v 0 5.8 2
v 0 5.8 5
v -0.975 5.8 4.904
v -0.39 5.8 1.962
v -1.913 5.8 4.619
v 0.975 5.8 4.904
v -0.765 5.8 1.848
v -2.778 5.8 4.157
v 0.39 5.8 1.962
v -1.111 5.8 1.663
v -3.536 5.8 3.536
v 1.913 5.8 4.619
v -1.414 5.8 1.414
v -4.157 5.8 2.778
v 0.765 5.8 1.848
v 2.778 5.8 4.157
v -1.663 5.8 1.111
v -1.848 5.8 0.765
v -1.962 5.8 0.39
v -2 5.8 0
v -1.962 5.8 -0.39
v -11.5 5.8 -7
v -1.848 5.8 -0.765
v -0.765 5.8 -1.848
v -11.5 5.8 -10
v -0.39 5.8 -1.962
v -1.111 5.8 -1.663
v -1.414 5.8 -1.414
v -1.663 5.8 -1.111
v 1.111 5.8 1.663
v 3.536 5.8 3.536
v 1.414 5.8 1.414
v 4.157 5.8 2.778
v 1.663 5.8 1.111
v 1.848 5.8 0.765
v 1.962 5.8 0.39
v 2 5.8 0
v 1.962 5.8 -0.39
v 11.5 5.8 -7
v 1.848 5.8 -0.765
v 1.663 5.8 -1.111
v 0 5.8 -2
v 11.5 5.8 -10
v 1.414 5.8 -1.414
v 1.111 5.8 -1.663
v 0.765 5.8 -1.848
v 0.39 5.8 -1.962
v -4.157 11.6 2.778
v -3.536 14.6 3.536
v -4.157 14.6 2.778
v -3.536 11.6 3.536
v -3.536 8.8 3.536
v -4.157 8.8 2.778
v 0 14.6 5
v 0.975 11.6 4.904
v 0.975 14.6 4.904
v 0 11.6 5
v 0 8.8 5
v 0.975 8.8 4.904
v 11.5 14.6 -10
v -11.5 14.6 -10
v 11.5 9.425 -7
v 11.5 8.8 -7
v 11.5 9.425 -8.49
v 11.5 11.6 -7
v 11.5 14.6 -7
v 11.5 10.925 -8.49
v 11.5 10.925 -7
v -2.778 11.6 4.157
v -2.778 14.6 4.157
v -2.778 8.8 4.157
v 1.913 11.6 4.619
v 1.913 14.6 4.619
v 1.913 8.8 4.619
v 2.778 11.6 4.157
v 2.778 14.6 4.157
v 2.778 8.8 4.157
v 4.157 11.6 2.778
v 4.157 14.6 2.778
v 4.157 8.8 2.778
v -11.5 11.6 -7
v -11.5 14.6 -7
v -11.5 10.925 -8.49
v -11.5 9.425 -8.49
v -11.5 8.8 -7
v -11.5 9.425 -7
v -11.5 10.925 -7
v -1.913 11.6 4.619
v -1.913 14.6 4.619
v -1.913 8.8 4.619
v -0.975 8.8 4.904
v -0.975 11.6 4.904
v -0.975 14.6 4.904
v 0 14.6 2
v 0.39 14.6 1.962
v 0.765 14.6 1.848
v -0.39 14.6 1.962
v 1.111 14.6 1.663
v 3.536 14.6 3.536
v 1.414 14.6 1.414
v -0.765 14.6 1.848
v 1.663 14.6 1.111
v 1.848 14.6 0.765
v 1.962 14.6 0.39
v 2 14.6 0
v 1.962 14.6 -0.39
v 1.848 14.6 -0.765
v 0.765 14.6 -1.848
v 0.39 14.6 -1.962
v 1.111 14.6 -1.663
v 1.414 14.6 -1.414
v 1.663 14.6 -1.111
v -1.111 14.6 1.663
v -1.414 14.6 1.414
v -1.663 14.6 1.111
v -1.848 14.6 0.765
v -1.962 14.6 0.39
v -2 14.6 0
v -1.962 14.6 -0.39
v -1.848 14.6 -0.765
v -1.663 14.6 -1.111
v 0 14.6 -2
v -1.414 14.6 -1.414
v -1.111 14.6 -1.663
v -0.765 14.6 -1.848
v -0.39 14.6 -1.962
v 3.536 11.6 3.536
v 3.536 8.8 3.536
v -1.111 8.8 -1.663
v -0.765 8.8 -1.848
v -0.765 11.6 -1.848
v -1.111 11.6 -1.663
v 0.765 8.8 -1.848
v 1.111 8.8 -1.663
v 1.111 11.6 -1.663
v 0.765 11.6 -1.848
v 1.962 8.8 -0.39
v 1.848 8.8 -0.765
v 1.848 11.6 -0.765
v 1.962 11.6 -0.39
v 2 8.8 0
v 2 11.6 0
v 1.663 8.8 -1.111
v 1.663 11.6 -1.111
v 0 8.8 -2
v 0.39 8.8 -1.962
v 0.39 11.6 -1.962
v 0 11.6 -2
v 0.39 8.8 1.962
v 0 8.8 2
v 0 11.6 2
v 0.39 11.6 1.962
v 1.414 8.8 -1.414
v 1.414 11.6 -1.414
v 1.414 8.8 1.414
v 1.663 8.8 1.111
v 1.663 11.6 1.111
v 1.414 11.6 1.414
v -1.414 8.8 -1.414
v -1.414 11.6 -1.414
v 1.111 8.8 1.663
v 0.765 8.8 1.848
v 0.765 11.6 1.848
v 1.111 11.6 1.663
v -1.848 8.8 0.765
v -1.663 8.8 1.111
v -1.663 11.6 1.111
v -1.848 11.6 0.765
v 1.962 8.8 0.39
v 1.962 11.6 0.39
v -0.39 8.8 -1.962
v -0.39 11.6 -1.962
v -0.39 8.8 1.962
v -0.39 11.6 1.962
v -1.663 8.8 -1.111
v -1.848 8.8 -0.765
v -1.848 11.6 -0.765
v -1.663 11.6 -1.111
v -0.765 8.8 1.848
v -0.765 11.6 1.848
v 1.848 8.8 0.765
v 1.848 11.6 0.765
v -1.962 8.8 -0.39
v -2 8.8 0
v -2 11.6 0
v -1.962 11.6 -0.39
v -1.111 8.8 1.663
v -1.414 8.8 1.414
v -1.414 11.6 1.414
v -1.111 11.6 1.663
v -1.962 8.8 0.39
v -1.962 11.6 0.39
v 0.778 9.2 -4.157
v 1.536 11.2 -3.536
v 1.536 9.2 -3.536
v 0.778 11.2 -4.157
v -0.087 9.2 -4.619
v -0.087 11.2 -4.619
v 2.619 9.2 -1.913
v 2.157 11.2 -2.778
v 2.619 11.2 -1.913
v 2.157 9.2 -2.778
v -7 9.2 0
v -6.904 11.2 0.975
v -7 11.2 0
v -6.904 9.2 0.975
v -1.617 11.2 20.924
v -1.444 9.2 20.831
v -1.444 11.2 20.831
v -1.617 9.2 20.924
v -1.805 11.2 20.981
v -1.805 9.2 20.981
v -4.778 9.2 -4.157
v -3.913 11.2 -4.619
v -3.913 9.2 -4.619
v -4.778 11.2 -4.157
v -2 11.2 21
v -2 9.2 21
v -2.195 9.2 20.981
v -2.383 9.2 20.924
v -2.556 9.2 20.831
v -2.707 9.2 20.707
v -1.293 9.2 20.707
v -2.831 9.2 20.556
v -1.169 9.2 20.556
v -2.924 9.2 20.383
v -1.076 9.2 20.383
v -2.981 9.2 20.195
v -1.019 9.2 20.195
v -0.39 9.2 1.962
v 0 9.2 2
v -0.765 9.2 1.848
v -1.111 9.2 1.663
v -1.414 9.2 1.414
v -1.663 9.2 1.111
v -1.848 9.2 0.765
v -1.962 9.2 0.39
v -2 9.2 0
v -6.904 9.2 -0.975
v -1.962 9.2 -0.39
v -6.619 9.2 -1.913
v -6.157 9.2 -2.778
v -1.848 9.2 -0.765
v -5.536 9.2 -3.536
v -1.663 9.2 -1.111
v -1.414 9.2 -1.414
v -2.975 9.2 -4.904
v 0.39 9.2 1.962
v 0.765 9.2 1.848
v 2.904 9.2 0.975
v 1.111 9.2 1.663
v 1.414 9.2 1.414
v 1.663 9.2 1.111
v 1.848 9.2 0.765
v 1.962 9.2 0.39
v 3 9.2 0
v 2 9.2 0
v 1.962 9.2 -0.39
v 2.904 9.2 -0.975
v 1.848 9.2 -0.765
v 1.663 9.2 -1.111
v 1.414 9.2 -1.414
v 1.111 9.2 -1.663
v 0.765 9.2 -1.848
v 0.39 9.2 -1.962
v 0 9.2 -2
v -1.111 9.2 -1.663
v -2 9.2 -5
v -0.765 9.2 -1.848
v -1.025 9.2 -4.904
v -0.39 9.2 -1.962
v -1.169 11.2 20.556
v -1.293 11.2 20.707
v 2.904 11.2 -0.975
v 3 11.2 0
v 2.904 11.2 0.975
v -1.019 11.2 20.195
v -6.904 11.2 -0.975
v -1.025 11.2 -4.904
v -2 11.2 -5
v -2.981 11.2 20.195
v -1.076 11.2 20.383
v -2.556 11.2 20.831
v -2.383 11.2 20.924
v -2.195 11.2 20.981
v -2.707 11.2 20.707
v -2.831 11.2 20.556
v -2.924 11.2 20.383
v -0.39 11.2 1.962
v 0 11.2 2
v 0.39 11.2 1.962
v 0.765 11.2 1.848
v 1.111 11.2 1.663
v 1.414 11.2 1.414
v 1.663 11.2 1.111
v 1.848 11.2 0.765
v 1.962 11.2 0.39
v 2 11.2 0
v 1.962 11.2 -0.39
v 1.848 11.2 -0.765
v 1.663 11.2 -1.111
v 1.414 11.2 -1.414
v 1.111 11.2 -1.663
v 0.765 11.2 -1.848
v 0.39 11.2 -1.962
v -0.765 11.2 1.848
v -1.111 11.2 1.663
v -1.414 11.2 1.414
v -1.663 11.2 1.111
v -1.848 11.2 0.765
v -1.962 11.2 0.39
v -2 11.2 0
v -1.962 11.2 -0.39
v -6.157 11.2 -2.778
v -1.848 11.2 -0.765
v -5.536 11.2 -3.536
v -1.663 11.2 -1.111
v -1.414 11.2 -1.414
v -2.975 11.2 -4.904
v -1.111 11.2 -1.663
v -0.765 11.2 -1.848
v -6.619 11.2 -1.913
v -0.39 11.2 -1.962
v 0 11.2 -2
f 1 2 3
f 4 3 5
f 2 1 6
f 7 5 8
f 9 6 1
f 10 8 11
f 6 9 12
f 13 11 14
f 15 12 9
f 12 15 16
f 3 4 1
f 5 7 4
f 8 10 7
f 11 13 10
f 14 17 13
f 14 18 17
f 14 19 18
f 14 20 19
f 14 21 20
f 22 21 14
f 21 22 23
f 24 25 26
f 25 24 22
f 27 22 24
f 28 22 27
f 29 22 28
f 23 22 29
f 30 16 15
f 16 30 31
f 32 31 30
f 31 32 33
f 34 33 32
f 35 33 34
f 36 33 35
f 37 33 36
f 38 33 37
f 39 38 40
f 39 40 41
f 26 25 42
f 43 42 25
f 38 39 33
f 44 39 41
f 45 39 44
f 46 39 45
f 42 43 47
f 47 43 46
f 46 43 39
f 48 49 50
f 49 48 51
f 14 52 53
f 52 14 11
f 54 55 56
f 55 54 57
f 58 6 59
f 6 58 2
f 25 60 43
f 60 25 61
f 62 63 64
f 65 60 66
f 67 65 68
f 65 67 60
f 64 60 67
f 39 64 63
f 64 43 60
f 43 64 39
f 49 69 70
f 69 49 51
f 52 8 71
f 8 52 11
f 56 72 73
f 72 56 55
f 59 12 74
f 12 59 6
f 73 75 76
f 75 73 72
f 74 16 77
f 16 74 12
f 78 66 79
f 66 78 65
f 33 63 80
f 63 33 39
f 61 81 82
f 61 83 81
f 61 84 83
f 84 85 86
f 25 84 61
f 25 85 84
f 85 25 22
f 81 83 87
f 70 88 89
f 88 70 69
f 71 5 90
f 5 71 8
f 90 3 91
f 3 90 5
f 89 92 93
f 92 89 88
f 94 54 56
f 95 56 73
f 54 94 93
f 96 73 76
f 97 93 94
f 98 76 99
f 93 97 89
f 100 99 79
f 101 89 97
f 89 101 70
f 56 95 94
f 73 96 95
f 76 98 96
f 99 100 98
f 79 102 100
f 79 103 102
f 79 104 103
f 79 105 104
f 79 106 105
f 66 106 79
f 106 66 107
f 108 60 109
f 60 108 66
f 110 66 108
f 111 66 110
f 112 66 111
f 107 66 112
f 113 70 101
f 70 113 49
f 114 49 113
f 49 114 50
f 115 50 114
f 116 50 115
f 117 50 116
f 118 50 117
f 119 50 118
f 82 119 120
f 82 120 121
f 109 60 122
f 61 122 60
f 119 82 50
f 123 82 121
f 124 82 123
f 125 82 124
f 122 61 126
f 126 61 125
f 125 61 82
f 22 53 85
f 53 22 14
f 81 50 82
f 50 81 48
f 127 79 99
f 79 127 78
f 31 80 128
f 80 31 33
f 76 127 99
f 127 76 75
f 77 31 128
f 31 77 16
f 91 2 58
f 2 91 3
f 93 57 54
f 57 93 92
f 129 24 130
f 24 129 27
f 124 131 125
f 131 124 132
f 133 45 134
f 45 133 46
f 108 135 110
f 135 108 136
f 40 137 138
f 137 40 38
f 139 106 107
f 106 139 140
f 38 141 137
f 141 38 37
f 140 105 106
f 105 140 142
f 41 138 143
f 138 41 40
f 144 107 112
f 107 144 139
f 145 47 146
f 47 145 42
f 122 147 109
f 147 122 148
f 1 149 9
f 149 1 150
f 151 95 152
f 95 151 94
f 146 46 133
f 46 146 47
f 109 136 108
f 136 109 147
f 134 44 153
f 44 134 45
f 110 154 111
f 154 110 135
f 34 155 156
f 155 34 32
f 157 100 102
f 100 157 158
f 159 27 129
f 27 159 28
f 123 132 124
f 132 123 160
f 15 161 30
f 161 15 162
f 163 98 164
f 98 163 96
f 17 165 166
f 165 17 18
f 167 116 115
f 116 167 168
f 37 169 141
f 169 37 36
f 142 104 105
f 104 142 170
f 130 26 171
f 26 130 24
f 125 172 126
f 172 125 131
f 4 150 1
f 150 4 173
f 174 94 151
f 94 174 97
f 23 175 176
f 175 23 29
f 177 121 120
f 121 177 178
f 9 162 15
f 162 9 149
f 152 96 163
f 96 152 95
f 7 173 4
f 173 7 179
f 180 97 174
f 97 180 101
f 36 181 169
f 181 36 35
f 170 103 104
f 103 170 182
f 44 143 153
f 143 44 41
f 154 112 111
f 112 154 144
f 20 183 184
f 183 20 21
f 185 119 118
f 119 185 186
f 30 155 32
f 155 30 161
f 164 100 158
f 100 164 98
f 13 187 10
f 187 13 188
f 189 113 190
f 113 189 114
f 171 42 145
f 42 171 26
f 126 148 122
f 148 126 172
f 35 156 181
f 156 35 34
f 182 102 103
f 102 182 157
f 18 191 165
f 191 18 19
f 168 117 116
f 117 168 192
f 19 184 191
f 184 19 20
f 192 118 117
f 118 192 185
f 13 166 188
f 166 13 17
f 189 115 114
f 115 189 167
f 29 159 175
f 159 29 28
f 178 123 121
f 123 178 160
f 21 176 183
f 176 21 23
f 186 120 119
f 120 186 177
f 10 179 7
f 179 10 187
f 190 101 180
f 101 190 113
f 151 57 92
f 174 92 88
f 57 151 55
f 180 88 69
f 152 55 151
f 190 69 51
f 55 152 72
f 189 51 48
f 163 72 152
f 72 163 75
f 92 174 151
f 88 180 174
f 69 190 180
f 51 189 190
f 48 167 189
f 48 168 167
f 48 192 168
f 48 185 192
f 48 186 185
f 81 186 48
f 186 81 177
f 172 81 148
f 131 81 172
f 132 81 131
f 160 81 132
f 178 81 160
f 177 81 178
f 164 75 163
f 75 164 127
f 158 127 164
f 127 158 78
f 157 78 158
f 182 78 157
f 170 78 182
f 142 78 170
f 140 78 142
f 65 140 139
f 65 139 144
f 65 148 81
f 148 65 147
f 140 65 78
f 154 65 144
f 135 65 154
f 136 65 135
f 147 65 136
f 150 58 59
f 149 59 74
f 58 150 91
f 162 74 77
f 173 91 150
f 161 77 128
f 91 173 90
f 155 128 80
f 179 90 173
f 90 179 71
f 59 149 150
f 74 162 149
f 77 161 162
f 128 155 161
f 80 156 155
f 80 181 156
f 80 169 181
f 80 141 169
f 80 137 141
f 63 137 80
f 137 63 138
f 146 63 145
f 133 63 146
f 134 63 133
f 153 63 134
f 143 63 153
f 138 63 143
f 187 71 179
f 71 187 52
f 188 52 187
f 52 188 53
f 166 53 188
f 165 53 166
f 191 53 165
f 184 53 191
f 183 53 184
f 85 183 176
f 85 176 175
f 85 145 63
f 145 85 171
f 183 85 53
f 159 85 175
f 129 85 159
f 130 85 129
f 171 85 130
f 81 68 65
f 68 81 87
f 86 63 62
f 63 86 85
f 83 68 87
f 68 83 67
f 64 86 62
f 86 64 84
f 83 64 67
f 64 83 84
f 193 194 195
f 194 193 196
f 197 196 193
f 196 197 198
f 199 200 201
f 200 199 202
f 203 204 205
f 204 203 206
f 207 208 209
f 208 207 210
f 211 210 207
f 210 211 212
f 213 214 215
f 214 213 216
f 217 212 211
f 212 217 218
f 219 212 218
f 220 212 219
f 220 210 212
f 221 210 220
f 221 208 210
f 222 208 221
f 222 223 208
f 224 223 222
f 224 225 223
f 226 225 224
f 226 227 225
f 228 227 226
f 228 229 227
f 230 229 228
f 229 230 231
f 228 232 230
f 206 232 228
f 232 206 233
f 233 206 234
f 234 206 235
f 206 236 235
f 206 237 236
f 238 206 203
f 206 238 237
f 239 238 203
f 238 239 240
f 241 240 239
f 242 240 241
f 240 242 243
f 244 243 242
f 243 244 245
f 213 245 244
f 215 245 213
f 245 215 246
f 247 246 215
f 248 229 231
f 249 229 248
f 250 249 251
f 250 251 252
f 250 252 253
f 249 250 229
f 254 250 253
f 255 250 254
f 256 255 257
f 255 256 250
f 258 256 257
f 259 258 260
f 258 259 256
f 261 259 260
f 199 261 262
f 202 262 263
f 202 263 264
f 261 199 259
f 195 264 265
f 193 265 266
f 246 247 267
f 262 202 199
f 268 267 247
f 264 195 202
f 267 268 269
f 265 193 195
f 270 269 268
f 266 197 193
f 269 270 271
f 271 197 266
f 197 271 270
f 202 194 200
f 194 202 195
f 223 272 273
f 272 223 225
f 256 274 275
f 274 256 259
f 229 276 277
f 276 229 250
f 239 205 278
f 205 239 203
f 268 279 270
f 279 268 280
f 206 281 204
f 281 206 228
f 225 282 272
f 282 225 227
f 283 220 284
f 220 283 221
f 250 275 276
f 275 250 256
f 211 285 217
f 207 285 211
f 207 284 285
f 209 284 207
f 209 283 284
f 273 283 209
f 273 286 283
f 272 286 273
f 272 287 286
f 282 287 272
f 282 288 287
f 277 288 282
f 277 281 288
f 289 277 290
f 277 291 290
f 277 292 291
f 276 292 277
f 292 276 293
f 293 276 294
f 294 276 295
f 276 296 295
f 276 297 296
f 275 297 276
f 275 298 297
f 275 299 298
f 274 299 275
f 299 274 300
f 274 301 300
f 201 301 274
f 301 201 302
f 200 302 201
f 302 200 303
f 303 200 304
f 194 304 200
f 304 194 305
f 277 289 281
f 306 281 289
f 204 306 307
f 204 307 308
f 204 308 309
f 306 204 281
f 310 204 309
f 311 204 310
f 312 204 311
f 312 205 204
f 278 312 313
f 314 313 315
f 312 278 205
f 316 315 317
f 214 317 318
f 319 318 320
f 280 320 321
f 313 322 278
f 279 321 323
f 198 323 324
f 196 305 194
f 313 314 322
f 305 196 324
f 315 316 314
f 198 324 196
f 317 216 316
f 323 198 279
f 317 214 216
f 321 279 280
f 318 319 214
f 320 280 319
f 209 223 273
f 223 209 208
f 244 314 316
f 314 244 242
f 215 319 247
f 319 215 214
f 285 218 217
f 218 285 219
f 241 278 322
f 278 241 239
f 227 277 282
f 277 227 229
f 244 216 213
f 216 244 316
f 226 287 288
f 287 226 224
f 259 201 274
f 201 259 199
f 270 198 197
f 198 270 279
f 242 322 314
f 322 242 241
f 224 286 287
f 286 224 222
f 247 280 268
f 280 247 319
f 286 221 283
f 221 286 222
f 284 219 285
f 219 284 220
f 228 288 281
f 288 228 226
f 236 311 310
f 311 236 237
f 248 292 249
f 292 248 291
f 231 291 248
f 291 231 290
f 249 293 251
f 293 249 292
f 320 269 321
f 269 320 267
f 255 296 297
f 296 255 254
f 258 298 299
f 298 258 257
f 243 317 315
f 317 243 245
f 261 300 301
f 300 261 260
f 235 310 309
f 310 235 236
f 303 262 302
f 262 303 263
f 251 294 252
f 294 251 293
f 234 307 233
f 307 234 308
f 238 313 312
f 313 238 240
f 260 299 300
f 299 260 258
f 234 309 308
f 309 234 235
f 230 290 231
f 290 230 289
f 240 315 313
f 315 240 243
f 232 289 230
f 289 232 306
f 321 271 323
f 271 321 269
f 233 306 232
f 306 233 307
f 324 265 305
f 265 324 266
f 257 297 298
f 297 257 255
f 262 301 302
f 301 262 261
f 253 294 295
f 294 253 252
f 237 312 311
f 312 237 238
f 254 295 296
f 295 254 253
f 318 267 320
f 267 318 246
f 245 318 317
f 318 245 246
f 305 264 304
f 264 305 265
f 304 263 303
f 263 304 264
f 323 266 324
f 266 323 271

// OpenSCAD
// Rotating cable lock

// Radius of large end of latch
outerR = 5;
// How far off-center the pivot point is
offset = 2;
// Length of latch
len = 20;
// Radius of pivot hole
hubR = 2;
// Width of latch
width = 2;
// Thickness of side and bottom walls
thick = 3;
// Clearance between base and latch
gap=0.4;
// Tightness (positive makes latch press harder against base)
tight = 0;
// Line Radius
lR = .75;
// Number of Latches
numLatches = 1;
// Angle of latch
angle = 90; //[0:180]
// Which part to print
part=0; //[0:Assembled, 1:Base, 2:Latch]

/* [Hidden] */
$fn=32;
spacing = width+gap+thick+gap;

if (part==0) rotate([-90,0,0]) assembled();
if (part==1) rotate([-90,0,0]) bases();
if (part==2) latch();

module bases() {
	for (l = [1:numLatches]) {
		translate([0,0,l*spacing]) base();
		}
	}

//module body() {
//	h = outerR+thick+hubR+thick;
//	difference() {
//		hull() {
//			translate([-1,len,outerR+thick]) rotate([0,90,0]) 
//				cylinder(r=hubR+thick, h=width+2*thick+2);	
//			}
//		cube([width+2*thick,2*len,h]);
//		translate([thick-gap,-1,thick]) cube([width+2*gap,2*len+2,h]);
//		pin();
//		}
//	}

module latches(angle) {
	for (l = [1:numLatches]) {
		translate([0,0,l*spacing]) latch(angle);
		}
	}

module latch(angle) {
	rotate([0,0,angle]) difference() {
		hull() {
			cylinder(r=outerR, h=width);
			translate([len,0,0]) cylinder(r=1, h=width);
			}
		translate([0,offset,-1]) cylinder(r=hubR,h=width+2);
		}
	}

module pin() {
	translate([-1,len,outerR+thick])
	rotate([0,90,0])
	cylinder(r=hubR, h=width+2*thick+2);
	}

module assembled() {
	color("blue") bases();
	color("yellow") rotate([0,0,-angle]) translate([0,-offset,thick+gap]) latches(0);
	}

module base() {
	h=outerR+offset;
	tall=width+2*(thick+gap);
	
	difference() {
		hull() {
			cylinder(r=hubR+thick,h=tall);
			translate([-len/2-thick/2,h,0]) cube([thick,thick,tall]);
			translate([len/2-thick/2,h,0]) cube([thick,thick,tall]);
			}
		translate([0,0,-1]) cylinder(r=hubR,h=width+2*thick+2*gap+2);
		translate([-len-1,-10-tight,thick]) cube([2*len+4,h+10,width+2*gap]);
		translate([-len-1,h-tight-.01,thick+width/2-lR/2]) cube([2*len+4,2*lR,2*lR]);
		//#translate([0,0,thick+gap+width/2]) cylinder(r=h+2*lR, h=lR);
		}
	}
